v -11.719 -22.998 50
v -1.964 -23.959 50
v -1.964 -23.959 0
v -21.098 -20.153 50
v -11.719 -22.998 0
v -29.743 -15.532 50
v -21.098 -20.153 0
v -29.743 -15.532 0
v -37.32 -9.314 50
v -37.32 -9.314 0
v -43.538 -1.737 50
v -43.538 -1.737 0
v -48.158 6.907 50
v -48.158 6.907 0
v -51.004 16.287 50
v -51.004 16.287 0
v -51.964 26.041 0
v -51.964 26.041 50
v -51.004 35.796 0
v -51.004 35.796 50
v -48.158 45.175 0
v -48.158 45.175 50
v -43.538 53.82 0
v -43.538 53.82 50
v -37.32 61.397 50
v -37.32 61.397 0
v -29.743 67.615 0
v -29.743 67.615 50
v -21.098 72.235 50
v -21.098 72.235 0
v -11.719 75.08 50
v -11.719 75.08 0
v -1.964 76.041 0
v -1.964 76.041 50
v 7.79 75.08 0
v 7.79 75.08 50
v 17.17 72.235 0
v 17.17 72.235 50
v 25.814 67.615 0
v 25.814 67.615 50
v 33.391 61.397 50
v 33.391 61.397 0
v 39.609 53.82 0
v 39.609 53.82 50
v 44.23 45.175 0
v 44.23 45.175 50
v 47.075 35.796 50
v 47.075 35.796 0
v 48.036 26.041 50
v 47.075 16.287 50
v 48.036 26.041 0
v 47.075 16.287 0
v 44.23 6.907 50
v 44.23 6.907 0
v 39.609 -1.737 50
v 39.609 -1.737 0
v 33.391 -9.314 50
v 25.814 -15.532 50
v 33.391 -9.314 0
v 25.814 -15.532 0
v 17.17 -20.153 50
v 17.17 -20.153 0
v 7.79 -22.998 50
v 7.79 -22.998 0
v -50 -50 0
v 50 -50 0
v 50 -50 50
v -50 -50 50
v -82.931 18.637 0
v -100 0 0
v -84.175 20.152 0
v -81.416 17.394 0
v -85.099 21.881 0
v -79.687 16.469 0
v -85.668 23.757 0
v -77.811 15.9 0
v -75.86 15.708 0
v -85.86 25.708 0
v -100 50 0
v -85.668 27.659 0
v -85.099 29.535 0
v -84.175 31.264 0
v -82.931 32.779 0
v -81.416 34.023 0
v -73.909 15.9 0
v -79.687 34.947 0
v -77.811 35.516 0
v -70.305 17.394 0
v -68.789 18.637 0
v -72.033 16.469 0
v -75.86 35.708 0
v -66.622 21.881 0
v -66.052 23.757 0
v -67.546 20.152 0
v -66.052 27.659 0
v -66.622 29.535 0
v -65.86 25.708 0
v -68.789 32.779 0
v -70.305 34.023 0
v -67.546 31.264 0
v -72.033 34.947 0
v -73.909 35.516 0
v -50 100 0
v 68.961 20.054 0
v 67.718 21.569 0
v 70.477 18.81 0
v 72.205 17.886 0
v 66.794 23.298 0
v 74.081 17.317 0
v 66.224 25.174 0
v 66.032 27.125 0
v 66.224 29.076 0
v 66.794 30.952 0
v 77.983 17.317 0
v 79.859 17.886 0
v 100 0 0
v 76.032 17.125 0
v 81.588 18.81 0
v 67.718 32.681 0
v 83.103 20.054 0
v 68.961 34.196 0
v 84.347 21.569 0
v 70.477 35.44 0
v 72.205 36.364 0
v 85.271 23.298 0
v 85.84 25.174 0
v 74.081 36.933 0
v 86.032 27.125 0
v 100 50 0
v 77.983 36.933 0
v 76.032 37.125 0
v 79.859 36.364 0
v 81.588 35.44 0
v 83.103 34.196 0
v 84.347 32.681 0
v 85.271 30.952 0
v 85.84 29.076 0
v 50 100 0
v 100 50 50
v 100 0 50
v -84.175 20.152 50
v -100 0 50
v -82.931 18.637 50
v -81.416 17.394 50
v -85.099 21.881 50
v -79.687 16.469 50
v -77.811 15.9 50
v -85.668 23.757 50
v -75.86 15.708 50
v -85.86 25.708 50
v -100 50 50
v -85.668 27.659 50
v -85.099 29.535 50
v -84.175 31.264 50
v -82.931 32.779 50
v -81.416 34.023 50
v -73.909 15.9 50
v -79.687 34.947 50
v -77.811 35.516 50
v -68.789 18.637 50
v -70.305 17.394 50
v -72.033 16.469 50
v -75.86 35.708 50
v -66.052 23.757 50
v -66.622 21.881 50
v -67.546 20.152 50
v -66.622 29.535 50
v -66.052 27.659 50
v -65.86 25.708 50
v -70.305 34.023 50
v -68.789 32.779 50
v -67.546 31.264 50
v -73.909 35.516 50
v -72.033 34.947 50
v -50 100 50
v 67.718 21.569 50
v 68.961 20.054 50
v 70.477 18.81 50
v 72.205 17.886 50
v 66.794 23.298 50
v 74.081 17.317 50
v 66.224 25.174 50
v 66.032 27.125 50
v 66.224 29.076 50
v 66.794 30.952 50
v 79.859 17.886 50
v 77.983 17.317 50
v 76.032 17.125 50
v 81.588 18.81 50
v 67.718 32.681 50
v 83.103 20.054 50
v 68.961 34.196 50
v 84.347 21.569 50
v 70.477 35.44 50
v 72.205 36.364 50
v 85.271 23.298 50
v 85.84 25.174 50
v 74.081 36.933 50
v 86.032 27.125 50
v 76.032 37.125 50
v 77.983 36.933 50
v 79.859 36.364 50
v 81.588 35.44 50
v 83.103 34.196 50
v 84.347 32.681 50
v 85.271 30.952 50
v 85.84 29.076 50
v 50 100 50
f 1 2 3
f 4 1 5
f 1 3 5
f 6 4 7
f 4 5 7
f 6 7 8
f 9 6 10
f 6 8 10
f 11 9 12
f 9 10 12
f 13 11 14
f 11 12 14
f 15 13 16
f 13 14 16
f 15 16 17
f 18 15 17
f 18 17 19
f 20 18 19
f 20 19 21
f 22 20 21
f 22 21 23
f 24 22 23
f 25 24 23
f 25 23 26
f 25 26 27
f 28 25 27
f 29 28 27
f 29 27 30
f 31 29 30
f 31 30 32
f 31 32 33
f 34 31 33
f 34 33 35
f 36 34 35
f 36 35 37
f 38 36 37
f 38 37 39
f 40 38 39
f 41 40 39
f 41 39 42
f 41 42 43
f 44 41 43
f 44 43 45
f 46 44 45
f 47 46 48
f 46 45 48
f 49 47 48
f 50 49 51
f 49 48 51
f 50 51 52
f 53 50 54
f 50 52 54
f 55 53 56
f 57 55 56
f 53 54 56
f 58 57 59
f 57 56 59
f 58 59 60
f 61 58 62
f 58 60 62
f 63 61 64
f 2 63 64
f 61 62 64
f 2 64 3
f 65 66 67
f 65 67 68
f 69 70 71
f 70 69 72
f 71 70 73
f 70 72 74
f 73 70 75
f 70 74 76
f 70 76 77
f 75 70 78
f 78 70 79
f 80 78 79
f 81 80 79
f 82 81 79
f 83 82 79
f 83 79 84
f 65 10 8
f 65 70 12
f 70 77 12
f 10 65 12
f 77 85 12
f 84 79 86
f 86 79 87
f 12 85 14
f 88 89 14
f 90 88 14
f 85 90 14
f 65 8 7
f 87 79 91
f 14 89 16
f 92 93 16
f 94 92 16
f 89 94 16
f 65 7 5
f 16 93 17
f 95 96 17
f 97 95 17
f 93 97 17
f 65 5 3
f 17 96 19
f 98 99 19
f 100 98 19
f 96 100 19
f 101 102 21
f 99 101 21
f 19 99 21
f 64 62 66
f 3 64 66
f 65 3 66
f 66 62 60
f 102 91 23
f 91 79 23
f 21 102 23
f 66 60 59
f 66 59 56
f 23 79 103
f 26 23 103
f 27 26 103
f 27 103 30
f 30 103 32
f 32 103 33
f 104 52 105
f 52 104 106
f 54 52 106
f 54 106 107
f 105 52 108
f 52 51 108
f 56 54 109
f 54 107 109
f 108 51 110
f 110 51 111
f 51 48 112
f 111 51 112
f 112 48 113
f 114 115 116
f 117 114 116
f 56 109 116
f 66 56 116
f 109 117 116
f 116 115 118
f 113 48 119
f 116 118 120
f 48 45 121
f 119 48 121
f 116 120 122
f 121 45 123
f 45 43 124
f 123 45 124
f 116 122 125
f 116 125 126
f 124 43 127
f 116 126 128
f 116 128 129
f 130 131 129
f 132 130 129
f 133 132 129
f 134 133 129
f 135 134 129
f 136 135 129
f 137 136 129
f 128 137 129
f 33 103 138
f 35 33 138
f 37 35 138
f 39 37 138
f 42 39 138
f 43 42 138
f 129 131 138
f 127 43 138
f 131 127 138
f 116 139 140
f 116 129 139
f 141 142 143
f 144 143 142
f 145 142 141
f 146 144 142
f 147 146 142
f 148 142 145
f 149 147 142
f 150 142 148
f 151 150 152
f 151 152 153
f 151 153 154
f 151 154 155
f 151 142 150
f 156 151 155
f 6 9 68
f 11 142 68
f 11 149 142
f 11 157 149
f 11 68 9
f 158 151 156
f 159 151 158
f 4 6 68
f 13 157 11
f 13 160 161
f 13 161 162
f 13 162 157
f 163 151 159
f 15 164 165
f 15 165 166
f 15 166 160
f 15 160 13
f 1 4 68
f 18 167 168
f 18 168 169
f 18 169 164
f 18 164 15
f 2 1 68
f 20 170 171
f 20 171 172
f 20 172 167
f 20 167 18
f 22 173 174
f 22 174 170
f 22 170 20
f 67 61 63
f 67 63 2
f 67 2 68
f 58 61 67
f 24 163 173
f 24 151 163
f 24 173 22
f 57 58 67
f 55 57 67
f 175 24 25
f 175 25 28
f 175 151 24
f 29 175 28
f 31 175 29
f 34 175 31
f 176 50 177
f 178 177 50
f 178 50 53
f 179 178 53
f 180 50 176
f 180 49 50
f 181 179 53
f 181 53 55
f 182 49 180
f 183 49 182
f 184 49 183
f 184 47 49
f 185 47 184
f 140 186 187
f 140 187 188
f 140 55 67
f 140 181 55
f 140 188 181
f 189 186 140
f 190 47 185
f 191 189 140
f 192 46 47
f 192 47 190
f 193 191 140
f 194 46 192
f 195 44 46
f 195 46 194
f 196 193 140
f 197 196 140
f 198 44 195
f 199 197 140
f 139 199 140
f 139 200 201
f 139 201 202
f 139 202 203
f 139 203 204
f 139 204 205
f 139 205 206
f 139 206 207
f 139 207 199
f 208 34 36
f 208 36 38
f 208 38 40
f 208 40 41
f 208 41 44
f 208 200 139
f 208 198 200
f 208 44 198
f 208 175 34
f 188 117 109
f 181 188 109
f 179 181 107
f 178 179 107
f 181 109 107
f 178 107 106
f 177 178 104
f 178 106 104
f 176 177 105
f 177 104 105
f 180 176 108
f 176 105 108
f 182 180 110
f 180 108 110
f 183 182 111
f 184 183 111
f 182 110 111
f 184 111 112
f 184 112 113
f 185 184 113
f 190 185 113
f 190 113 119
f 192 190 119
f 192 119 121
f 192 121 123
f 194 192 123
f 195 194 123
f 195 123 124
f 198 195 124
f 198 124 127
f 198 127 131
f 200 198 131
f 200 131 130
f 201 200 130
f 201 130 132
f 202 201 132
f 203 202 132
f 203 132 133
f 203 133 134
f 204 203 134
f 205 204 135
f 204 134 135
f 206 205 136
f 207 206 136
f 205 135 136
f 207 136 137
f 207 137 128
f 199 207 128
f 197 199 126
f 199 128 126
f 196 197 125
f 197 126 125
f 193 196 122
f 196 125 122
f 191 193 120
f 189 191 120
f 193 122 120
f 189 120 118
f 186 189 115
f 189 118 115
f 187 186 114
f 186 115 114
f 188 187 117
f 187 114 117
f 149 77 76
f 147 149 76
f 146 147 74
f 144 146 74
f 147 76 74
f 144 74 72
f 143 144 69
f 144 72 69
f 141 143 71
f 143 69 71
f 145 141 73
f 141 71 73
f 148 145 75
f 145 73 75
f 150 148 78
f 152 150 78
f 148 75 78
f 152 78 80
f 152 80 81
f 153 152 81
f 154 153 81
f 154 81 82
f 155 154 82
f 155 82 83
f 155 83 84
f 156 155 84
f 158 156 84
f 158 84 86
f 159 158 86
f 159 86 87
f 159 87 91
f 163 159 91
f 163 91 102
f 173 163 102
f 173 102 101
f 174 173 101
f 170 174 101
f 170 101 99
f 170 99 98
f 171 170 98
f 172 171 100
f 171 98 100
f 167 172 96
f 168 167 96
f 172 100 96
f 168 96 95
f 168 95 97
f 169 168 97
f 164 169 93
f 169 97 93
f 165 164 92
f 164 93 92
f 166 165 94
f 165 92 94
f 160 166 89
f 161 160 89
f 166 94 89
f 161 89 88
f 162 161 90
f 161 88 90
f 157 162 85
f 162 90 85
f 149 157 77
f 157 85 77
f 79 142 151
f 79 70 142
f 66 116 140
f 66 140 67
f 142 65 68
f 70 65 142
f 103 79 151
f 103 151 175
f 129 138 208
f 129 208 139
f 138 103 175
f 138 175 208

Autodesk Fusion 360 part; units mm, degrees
sketch "Sketch1" plane through (0, 0, 0) normal (0, 0, 1) x (1, 0, 0)
  line L0 (-50, 100) -> (50, 100)
  line L1 (50, 100) -> (100, 50)
  line L2 (100, 50) -> (100, 0)
  line L3 (100, 0) -> (50, -50)
  line L4 (50, -50) -> (-50, -50)
  line L5 (-50, -50) -> (-100, 0)
  line L6 (-100, 0) -> (-100, 50)
  line L7 (-100, 50) -> (-50, 100)
extrude "Extrude1" add sketch "Sketch1" along normal blind 50
hole "Hole1" at (-1.9643, 26.0412, 50) direction (0, 0, -1) diameter 100 depth 60 tip angle 118
hole "Hole2" at (76.0323, 27.1251, 50) direction (0, 0, -1) diameter 20 depth 60 tip angle 118
hole "Hole3" at (-75.8603, 25.7082, 50) direction (0, 0, -1) diameter 20 depth 60 tip angle 118
